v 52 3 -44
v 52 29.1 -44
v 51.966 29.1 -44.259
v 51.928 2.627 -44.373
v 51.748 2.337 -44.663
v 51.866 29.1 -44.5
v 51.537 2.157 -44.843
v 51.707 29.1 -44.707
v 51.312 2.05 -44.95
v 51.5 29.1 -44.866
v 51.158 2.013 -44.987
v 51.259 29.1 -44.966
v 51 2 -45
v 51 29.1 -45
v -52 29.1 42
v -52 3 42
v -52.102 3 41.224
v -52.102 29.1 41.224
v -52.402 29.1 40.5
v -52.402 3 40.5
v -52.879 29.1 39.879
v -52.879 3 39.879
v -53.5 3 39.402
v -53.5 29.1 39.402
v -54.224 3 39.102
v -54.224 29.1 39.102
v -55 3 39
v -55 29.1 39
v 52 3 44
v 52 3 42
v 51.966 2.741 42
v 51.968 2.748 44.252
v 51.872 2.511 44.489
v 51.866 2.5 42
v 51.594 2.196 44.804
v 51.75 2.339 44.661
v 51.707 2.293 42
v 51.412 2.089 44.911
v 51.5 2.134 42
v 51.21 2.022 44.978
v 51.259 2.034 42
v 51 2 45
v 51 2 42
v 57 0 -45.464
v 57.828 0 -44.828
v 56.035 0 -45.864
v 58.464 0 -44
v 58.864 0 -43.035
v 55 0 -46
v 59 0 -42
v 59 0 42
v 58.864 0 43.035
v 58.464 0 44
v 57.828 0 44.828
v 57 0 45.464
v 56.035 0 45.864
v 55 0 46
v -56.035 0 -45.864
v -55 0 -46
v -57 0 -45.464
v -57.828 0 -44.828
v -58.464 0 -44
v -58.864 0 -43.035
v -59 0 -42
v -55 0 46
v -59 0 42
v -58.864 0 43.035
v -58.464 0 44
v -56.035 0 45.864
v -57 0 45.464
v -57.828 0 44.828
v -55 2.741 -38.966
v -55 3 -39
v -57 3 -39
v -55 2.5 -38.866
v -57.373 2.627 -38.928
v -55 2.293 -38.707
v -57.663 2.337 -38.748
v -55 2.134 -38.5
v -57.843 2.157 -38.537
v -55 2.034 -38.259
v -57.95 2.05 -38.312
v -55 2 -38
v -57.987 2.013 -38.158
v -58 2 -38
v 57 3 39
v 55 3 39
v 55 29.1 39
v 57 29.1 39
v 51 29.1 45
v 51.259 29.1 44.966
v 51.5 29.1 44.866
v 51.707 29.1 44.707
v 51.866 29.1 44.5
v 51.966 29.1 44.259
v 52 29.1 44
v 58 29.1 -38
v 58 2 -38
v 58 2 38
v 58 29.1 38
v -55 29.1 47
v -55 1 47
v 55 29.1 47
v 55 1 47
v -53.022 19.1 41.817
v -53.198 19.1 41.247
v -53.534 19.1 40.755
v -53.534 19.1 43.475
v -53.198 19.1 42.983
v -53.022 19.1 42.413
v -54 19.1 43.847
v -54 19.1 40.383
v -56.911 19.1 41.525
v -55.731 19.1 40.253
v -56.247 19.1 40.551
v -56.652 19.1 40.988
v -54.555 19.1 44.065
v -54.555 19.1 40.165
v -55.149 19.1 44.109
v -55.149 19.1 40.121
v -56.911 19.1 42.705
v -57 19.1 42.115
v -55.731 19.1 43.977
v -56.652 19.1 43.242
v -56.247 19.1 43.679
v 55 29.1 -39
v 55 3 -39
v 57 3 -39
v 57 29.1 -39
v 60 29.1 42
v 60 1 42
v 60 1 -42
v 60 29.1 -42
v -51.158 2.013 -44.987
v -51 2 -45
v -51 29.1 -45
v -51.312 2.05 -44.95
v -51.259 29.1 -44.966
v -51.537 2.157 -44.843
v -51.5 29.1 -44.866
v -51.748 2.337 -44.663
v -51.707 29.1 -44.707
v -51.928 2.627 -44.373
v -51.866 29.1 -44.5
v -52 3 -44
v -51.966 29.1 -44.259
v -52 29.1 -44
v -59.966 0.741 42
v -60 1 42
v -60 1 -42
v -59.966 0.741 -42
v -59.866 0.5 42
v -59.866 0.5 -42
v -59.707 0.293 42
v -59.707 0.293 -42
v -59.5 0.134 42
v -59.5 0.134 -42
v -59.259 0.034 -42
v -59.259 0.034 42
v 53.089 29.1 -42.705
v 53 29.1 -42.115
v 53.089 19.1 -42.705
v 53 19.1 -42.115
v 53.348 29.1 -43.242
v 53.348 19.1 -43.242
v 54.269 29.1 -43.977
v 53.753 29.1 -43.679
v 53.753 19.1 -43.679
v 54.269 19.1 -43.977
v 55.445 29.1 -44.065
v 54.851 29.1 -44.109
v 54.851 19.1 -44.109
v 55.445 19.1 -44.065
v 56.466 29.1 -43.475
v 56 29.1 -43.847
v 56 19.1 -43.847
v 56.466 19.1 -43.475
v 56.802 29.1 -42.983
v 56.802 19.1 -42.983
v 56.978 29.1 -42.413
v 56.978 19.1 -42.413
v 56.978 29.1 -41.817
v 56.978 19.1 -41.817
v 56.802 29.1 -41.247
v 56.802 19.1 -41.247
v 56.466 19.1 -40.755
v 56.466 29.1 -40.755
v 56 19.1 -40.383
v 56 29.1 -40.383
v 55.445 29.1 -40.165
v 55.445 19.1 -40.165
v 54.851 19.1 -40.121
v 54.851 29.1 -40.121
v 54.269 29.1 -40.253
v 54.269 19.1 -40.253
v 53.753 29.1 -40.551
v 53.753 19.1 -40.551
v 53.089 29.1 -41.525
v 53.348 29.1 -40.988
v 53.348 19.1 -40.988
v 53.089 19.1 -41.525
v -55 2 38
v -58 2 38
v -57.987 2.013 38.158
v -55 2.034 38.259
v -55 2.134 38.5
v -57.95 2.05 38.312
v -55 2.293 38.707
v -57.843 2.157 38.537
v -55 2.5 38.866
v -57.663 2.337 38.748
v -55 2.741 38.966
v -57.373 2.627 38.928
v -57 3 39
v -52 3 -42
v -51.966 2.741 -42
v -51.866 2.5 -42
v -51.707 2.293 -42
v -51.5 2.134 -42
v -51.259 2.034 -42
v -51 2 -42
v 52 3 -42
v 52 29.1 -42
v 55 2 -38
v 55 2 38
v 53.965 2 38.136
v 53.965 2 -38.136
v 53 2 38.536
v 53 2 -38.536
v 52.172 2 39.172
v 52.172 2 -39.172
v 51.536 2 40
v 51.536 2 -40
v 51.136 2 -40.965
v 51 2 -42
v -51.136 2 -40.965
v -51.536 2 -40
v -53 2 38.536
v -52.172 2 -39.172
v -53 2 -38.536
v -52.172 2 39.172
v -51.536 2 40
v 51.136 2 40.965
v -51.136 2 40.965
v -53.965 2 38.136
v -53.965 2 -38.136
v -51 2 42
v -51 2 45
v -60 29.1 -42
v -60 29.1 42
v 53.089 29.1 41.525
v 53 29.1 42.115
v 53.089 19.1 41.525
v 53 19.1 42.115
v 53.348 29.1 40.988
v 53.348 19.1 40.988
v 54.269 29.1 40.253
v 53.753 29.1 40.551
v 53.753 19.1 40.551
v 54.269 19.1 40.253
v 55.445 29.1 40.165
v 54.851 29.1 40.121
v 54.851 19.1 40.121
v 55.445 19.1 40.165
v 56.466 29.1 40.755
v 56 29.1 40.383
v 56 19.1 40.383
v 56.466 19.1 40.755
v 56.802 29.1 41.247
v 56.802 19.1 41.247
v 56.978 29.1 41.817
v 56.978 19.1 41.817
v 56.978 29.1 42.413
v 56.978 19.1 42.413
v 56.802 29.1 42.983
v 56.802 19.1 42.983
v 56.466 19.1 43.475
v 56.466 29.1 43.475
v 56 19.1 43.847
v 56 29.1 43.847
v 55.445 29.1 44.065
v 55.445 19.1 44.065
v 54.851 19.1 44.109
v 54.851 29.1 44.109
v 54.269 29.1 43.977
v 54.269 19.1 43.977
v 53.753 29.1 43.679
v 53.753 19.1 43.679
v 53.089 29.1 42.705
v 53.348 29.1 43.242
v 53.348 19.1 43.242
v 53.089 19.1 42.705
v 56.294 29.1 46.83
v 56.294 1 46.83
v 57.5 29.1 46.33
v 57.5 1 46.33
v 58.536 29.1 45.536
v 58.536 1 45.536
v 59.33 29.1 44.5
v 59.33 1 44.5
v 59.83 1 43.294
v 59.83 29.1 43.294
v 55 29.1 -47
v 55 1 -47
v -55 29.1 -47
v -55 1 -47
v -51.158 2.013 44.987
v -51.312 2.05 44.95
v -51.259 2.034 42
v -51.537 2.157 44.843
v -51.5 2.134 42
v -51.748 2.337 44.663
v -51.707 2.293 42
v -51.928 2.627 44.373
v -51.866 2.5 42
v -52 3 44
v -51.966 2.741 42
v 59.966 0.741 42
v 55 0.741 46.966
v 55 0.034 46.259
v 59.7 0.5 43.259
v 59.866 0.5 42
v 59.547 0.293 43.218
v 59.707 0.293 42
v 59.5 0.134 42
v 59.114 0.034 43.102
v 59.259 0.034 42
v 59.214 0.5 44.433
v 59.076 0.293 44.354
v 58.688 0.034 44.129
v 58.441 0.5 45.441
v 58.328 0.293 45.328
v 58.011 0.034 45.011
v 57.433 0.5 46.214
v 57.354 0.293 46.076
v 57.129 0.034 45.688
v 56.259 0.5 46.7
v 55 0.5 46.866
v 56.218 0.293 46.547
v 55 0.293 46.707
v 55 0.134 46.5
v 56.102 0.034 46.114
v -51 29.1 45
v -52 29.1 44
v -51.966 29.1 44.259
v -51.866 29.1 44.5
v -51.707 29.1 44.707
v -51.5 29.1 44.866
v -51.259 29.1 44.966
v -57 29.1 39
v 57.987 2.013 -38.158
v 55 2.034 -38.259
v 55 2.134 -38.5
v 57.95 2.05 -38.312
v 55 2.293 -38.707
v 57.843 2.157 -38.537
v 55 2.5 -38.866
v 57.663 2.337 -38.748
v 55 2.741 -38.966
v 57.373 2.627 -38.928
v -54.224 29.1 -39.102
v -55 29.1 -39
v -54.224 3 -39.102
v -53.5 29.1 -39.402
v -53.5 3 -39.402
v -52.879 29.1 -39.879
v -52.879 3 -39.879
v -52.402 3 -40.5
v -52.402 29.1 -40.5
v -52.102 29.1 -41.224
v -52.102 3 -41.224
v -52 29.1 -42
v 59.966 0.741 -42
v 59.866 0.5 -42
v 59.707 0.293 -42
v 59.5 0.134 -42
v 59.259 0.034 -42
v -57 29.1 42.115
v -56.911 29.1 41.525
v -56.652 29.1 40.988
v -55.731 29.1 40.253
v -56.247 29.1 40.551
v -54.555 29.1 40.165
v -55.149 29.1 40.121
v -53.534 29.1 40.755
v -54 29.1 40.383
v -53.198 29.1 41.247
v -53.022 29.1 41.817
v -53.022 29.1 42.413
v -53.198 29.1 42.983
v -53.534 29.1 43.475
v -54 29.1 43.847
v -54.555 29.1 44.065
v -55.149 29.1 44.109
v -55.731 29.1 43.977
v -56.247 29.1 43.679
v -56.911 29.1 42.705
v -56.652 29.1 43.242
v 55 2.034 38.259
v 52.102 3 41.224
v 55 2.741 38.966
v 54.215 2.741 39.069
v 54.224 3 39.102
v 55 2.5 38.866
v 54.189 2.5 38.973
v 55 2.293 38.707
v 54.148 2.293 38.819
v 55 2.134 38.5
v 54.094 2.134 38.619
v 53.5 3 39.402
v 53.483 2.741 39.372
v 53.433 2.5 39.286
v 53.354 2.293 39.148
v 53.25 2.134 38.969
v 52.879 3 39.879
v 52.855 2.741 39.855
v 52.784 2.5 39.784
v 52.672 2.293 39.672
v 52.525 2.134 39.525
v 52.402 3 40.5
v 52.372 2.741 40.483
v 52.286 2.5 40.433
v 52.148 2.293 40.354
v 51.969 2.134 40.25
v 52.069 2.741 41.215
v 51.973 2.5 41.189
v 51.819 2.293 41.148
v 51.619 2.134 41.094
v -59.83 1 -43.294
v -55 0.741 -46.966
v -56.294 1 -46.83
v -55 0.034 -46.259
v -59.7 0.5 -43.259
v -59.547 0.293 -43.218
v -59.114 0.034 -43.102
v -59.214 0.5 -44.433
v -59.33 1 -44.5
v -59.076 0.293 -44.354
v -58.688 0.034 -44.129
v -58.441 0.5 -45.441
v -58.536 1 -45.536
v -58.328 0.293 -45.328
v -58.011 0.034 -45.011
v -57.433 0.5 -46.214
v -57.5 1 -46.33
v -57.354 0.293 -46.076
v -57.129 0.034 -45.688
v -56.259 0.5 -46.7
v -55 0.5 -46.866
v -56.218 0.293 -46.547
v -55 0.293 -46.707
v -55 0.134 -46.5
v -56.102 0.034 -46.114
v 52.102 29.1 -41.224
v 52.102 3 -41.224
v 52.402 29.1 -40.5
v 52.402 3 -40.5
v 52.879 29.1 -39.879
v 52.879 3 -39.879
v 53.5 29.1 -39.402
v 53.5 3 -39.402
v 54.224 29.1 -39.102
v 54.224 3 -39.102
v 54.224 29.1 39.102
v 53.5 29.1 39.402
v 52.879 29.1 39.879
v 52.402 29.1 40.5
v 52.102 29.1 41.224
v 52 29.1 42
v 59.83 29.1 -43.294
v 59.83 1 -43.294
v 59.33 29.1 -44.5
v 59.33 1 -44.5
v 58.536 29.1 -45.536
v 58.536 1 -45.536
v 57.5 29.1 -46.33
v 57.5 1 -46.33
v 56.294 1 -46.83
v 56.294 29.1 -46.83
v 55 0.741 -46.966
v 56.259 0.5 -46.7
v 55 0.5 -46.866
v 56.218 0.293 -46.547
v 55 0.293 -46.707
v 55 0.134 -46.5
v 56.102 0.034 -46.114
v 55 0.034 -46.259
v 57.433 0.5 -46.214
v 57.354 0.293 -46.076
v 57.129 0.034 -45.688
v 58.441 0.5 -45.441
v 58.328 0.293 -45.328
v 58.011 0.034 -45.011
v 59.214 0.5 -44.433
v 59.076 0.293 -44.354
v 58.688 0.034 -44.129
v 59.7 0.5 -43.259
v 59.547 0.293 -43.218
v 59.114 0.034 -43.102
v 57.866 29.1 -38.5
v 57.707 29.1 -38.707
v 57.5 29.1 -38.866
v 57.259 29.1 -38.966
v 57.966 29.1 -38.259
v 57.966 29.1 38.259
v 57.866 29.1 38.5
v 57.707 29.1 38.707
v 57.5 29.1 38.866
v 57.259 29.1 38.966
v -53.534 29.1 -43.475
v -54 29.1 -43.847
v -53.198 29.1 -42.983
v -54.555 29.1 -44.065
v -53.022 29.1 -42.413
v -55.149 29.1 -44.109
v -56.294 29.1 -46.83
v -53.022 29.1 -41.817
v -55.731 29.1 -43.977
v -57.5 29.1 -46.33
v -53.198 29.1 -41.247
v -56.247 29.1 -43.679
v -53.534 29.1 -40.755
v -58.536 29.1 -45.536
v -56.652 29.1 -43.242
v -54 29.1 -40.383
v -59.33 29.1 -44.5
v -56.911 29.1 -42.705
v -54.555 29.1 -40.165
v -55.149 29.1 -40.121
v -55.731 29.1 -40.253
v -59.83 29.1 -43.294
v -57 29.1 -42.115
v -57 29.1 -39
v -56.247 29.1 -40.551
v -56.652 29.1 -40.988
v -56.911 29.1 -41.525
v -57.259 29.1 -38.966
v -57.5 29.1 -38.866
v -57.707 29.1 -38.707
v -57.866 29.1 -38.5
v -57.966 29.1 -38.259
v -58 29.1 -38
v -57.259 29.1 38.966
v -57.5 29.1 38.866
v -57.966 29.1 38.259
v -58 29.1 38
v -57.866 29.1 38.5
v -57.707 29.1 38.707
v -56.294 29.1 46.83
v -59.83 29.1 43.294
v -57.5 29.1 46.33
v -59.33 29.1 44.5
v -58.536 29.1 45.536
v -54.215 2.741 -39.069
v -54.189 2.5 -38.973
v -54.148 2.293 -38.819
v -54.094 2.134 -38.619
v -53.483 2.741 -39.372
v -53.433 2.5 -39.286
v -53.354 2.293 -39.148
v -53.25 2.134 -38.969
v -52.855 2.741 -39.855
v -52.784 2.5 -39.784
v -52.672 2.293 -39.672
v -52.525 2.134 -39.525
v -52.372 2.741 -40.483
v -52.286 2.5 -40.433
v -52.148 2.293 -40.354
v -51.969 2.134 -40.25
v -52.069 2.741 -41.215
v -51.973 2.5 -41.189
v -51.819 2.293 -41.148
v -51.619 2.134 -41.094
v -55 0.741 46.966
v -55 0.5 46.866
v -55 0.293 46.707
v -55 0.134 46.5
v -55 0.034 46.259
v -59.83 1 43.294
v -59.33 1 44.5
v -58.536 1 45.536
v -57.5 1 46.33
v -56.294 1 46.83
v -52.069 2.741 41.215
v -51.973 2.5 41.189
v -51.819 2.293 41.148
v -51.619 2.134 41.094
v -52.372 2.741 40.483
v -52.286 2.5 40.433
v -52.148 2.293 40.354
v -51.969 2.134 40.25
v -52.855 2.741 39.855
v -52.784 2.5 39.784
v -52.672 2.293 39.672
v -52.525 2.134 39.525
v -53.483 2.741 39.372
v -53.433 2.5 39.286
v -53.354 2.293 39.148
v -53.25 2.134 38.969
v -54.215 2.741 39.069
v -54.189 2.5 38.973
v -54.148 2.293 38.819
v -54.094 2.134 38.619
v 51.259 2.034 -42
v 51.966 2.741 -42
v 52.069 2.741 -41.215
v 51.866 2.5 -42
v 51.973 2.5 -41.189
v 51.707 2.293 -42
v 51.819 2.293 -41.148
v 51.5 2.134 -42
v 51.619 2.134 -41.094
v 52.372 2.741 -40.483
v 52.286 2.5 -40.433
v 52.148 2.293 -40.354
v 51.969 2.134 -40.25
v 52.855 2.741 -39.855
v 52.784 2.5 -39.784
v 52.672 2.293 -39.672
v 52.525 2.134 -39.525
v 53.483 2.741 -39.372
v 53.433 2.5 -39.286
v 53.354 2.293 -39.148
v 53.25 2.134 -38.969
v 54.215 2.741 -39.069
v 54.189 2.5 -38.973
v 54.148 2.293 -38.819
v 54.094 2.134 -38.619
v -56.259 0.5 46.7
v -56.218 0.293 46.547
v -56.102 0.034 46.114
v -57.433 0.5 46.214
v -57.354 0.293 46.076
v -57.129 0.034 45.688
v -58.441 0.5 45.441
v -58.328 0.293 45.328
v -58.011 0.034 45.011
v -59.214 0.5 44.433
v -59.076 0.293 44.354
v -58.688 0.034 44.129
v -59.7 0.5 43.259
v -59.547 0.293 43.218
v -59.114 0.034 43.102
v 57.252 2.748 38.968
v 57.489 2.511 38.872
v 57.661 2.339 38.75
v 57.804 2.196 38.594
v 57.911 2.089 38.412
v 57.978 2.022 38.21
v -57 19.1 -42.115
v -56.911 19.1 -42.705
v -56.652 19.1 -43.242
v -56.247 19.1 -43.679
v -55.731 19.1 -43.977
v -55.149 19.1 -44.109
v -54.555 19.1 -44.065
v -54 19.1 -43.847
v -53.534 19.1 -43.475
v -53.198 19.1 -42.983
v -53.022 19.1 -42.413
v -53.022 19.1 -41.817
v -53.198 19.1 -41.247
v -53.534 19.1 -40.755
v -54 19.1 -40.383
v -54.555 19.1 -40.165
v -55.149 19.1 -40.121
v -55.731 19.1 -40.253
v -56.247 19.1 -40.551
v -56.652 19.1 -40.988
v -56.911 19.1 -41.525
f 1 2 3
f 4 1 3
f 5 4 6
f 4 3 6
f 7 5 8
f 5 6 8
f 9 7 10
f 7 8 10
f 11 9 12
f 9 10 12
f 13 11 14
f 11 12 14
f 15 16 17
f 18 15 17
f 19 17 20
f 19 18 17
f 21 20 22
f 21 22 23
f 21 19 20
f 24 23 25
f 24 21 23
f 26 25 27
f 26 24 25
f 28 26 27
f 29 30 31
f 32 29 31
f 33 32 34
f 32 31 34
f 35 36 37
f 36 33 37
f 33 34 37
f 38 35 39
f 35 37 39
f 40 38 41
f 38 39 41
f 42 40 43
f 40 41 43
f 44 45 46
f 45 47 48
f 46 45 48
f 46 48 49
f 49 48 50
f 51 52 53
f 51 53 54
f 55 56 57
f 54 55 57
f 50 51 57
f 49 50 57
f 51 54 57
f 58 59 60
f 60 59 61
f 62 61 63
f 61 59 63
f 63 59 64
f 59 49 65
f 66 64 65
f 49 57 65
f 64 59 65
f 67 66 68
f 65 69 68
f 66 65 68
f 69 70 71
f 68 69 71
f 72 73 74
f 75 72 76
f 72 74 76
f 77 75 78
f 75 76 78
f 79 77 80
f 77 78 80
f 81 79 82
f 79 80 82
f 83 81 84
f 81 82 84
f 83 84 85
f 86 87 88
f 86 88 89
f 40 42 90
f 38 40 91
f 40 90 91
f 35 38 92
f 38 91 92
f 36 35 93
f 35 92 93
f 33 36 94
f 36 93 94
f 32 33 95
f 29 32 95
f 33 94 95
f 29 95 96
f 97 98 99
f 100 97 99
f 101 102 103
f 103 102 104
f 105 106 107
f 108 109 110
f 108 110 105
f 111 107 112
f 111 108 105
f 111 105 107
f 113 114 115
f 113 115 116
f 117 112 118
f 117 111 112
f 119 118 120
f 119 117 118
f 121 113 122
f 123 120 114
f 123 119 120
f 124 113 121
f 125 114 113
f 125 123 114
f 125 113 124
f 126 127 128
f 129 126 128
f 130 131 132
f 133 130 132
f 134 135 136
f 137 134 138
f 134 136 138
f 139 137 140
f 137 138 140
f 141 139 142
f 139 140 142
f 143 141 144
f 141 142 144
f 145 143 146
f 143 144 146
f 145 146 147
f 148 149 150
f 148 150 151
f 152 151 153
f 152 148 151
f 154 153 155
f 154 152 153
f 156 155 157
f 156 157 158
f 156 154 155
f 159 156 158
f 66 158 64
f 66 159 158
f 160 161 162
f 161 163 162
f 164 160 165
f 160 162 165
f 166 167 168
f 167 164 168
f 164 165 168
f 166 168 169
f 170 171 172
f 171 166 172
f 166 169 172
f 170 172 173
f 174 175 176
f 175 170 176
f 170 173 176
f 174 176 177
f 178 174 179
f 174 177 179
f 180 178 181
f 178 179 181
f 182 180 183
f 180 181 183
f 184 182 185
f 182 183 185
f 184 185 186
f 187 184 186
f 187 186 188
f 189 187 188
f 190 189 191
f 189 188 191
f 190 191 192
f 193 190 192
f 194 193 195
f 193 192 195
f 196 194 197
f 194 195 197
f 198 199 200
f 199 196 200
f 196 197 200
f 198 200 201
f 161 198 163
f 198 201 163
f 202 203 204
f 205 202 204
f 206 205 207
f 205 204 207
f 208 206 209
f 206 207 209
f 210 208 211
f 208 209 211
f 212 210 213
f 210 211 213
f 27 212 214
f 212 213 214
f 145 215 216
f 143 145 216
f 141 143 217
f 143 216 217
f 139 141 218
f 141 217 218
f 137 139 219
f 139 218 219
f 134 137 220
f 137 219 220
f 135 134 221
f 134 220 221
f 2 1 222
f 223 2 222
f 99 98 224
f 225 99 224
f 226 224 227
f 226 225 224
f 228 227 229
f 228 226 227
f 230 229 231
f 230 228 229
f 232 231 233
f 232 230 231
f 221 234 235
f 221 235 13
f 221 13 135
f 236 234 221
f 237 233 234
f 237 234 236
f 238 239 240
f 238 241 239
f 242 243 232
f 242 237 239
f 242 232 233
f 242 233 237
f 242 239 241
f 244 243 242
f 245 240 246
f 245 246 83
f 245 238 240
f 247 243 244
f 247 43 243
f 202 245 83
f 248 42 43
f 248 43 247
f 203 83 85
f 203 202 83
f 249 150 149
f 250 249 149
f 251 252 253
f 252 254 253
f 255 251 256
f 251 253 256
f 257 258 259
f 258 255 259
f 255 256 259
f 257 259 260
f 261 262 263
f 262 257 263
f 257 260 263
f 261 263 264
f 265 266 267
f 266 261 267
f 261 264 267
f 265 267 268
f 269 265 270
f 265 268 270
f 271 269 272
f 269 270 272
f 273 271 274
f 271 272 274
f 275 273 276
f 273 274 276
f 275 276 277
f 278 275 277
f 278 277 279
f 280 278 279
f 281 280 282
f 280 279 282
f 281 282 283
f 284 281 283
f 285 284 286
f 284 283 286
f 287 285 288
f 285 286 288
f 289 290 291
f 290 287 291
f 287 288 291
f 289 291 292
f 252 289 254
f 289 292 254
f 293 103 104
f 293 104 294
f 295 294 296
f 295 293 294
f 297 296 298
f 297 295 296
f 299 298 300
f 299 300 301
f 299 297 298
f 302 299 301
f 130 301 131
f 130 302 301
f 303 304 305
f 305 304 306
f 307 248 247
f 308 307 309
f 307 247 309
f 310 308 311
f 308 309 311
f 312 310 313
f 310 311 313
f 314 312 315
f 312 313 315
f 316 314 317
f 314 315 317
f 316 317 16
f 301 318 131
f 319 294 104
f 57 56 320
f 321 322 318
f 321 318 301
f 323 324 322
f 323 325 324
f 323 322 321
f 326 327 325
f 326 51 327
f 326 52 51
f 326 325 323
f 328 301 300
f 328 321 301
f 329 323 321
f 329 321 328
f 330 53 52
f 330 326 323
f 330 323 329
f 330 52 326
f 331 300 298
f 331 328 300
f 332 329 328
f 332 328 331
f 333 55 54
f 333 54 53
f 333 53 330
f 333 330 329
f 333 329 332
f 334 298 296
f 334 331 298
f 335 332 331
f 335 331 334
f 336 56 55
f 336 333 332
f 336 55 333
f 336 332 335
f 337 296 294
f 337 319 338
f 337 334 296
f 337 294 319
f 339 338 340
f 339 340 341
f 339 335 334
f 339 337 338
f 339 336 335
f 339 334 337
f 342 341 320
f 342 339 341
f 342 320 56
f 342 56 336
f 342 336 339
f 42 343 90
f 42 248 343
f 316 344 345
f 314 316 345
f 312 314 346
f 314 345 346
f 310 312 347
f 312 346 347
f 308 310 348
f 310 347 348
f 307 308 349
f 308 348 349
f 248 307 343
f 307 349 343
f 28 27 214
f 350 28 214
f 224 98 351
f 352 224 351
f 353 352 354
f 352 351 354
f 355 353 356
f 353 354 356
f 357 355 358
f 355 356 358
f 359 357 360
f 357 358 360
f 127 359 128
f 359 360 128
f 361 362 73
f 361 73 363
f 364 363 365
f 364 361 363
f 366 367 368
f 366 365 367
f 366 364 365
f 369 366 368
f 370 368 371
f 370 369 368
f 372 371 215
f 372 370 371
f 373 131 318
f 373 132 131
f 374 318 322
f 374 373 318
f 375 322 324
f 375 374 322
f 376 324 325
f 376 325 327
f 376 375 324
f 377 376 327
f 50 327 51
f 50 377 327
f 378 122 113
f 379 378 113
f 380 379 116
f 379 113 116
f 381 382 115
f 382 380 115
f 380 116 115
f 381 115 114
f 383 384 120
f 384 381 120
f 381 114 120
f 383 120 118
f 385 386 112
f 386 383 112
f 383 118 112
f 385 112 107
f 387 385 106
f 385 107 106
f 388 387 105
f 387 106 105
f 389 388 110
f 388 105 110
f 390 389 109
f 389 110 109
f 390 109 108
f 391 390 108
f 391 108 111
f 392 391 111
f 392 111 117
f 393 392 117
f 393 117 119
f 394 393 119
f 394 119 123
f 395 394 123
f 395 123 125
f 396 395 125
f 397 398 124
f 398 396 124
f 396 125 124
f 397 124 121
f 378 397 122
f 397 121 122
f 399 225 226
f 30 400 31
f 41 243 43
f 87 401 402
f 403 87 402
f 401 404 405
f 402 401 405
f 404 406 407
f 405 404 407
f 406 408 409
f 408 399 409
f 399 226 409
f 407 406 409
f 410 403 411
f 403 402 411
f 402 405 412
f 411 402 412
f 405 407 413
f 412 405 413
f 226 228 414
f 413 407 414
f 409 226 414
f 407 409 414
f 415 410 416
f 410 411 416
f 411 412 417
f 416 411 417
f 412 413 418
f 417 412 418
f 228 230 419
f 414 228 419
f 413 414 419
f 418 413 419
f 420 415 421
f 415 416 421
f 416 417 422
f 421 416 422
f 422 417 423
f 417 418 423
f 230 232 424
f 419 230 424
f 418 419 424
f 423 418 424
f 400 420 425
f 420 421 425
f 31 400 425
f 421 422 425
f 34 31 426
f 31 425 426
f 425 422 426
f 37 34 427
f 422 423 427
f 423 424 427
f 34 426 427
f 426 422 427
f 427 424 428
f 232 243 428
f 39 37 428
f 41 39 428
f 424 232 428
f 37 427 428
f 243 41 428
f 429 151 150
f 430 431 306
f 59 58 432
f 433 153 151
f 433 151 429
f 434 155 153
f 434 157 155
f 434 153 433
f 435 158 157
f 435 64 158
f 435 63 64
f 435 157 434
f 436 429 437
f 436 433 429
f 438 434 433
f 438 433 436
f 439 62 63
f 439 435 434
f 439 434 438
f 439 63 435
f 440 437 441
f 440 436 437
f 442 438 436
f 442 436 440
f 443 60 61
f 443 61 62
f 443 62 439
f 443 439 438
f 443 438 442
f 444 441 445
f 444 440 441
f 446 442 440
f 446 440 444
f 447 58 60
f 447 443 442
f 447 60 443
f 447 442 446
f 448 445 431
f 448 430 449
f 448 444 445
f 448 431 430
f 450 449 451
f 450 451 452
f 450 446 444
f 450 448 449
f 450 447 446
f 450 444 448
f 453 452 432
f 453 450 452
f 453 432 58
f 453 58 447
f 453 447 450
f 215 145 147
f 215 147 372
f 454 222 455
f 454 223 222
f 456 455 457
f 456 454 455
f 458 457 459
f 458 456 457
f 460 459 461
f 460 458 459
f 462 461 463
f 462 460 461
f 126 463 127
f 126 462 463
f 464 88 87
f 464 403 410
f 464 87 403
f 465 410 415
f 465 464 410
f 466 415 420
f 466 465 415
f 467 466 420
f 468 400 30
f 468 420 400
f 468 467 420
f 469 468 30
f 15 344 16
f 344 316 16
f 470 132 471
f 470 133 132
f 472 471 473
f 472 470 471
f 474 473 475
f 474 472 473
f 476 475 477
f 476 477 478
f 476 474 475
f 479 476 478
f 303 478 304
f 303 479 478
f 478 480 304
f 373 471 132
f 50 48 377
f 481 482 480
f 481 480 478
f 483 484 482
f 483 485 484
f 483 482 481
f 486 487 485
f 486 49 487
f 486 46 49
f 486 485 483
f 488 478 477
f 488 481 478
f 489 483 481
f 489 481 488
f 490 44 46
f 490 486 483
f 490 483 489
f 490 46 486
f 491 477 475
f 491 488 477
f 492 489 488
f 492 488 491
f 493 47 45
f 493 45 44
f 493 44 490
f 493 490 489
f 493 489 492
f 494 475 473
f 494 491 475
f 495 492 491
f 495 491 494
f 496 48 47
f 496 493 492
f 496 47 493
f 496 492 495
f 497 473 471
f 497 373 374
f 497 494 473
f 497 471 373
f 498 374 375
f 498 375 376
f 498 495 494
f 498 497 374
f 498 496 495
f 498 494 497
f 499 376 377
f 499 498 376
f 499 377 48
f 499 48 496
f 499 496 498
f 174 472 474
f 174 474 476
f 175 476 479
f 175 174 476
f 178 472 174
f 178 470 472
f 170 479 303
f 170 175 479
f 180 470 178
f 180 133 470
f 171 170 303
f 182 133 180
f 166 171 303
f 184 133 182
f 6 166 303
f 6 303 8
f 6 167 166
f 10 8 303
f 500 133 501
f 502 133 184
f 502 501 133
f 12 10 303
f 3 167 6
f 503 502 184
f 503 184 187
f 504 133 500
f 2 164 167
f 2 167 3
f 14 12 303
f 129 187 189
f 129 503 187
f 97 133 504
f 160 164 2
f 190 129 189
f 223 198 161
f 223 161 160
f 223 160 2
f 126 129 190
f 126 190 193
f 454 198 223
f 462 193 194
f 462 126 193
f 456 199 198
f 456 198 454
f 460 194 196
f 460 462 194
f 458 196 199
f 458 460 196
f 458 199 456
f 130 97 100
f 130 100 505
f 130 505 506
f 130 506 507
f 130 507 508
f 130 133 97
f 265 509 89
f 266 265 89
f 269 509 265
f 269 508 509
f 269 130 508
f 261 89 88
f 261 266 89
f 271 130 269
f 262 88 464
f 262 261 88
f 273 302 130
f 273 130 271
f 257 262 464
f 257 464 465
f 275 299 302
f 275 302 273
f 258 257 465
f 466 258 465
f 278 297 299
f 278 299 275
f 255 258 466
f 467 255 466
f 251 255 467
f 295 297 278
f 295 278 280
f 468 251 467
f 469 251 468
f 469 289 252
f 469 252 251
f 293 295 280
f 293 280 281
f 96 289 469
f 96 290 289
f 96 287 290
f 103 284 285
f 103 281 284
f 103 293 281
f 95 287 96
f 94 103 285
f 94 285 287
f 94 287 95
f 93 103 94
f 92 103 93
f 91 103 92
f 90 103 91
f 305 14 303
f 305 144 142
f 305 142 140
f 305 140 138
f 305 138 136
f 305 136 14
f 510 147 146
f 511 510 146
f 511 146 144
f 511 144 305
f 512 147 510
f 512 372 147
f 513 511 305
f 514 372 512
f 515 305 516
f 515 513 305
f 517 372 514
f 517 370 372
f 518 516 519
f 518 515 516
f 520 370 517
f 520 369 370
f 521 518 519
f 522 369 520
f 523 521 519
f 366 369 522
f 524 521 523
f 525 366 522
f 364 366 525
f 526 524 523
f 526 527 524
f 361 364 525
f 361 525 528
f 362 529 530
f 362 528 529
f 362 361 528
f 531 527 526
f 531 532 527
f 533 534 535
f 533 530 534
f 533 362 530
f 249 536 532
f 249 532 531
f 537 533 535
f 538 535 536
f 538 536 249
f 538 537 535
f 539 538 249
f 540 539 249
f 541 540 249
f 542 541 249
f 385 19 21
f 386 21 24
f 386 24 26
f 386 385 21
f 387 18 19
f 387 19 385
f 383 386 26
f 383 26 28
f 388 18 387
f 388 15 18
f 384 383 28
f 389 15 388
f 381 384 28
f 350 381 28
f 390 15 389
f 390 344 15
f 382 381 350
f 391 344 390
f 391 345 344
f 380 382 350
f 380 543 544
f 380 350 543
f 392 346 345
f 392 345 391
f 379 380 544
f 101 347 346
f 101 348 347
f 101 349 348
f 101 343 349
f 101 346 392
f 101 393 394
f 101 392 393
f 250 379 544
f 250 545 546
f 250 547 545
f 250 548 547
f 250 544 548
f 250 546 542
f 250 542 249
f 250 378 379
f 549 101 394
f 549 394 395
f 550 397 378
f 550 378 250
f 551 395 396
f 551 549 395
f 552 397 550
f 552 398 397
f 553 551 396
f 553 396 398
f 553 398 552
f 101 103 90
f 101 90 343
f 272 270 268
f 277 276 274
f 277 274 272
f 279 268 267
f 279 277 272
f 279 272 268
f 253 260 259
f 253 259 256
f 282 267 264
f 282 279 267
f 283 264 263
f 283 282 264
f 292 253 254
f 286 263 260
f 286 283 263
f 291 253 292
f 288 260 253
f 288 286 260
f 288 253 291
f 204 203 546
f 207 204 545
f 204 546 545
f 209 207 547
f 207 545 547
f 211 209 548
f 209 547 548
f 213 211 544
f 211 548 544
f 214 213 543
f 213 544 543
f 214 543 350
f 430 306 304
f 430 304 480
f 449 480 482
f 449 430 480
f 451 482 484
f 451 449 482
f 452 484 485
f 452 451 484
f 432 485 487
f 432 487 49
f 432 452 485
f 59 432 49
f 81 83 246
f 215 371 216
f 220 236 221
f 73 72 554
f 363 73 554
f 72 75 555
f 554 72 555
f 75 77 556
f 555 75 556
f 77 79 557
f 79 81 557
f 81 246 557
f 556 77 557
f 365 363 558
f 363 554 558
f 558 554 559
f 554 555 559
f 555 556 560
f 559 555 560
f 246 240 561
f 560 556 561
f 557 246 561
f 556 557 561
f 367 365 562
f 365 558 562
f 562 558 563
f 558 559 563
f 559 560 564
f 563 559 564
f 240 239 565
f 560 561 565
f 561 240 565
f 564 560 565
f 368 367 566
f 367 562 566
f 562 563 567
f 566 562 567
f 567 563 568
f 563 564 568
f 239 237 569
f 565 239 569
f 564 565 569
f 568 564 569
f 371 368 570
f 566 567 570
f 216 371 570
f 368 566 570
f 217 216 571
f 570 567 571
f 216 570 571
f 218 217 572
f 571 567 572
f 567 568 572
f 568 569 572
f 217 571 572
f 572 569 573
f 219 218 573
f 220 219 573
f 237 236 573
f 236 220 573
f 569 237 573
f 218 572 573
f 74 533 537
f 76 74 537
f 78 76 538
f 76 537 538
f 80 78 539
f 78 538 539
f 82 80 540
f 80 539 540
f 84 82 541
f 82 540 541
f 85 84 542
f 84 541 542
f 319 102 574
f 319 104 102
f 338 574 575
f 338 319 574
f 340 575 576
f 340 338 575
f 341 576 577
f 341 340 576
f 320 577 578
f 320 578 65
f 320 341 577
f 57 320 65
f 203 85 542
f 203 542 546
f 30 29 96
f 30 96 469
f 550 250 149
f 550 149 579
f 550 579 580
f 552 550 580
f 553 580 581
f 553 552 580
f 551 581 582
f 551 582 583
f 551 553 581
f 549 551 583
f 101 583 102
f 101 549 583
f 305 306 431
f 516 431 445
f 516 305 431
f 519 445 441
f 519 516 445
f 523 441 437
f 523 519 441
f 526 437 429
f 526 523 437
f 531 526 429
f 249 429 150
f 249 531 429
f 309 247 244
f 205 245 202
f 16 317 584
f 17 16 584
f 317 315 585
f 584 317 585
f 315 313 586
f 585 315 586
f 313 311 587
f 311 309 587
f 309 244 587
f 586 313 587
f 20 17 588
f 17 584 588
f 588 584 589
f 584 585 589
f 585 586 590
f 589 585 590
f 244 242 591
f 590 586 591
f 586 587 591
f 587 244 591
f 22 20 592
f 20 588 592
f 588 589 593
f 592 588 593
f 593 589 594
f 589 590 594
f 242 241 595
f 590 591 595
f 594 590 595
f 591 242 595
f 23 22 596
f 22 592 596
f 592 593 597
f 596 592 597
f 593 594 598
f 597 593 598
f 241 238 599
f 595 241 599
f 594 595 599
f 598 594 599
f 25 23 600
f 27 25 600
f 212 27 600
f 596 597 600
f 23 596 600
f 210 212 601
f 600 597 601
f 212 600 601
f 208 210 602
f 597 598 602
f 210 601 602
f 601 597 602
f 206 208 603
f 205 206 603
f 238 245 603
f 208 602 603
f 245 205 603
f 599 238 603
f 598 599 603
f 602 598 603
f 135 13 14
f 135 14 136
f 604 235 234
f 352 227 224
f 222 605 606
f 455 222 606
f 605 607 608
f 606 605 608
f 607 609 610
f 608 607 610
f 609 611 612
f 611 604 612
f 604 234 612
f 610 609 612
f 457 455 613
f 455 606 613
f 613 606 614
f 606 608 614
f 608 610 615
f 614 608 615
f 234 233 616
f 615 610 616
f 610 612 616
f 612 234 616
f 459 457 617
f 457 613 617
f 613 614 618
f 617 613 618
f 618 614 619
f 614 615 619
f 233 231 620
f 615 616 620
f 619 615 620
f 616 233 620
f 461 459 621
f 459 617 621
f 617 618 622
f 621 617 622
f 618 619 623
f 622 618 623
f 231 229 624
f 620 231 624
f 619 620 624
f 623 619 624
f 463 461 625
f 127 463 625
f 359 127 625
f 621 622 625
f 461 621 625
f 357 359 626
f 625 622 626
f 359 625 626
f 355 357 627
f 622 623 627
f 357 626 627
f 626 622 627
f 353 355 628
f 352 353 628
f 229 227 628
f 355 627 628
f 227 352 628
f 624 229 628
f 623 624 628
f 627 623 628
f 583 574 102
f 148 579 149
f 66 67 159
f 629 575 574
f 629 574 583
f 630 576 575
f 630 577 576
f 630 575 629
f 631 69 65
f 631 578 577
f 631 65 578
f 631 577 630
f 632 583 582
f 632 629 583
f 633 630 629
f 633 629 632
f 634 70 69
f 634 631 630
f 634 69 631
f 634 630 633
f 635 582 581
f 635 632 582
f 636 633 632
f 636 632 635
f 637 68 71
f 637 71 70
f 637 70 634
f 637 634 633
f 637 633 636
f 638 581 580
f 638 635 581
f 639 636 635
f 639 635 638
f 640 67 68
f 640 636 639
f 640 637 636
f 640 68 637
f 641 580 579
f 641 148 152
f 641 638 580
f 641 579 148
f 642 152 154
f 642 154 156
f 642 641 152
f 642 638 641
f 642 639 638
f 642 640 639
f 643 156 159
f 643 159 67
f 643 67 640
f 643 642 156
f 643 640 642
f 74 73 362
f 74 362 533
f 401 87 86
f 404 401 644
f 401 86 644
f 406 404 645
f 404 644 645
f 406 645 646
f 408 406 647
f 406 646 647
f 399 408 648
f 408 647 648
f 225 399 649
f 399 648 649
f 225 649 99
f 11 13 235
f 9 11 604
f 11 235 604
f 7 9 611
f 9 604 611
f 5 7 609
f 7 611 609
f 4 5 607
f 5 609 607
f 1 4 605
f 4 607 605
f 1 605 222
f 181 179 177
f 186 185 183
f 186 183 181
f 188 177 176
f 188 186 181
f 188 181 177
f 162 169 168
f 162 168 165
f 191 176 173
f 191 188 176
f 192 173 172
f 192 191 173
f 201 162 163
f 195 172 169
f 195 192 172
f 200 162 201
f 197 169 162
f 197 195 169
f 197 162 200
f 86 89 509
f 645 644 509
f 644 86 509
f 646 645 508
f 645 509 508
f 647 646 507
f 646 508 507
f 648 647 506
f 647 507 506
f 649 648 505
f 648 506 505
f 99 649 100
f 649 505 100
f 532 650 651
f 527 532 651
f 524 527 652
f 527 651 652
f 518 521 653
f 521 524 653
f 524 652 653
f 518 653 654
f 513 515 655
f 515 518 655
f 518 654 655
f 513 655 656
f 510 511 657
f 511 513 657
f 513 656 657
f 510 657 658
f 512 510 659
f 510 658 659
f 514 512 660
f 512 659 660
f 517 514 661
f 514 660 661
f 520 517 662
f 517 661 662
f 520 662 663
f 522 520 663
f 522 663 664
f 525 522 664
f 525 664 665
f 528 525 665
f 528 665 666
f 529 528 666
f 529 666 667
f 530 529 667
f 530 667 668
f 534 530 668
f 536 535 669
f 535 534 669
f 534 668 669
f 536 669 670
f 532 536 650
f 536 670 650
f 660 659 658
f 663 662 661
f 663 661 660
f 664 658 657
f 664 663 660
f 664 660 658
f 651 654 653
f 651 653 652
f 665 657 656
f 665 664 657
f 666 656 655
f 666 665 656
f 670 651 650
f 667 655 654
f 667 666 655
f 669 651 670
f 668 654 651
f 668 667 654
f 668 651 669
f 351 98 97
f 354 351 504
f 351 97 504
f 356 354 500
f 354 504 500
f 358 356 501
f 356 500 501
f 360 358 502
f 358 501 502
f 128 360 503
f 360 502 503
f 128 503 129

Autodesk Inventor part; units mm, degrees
ref_plane "YZ Plane" through (0, 0, 0) normal (1, 0, 0) x (0, 1, 0)
ref_plane "XZ Plane" through (0, 0, 0) normal (0, 1, 0) x (-1, 0, 0)
ref_plane "XY Plane" through (0, 0, 0) normal (0, 0, 1) x (1, 0, 0)
sketch "Esquisse1" plane through (0, 0, 0) normal (0, 1, 0) x (-1, 0, 0)
  line L0 (60, 47) -> (-60, 47)
  line L1 (-60, 47) -> (-60, -47)
  line L2 (-60, -47) -> (60, -47)
  line L3 (60, -47) -> (60, 47)
  line L4 (60, 47) -> (-60, -47) construction
  line L5 (-60, 47) -> (60, -47) construction
  line L6 (60, -47) -> (52, -47)
  line L7 (52, -47) -> (52, -39)
  line L8 (52, -39) -> (60, -39)
  line L9 (60, -39) -> (60, -47)
  line L10 (-60, -47) -> (-52, -47)
  line L11 (-52, -47) -> (-52, -39)
  line L12 (-52, -39) -> (-60, -39)
  line L13 (-60, -39) -> (-60, -47)
  line L14 (60, 47) -> (52, 47)
  line L15 (52, 47) -> (52, 39)
  line L16 (52, 39) -> (60, 39)
  line L17 (60, 39) -> (60, 47)
  line L18 (-60, 47) -> (-52, 47)
  line L19 (-52, 47) -> (-52, 39)
  line L20 (-52, 39) -> (-60, 39)
  line L21 (-60, 39) -> (-60, 47)
  circle A0 centre (-55, -42.115) radius 2
  line L22 (0, -47.6968) -> (0, 50.167) construction
  line L23 (81.8074, 0) -> (-86.221, 0) construction
  circle A1 centre (55, -42.115) radius 2
  circle A2 centre (-55, 42.115) radius 2
  circle A3 centre (55, 42.115) radius 2
  line L24 (58, -47) -> (58, 47)
  line L25 (60, 45) -> (-60, 45)
  line L26 (-60, -45) -> (60, -45)
  line L27 (-58, -47) -> (-58, 47)
  point P0 (0, 0)
  point P1 (-58, 39)
  point P2 (-58, -39)
  point P3 (-52, -45)
  point P4 (52, -45)
  point P5 (58, -39)
  point P6 (58, 39)
  point P7 (52, 45)
  point P8 (-52, 45)
  dimension "d0" = 120
  dimension "d1" = 94
  dimension "d2" = 8
  dimension "d3" = 8
  dimension "d4" = 8
  dimension "d5" = 8
  dimension "d6" = 8
  dimension "d8" = 4
  dimension "d9" = 55
  dimension "d10" = 42.115
  dimension "d11" = 8
  dimension "d12" = 2
  dimension "d13" = 2
  dimension "d14" = 2
  dimension "d15" = 2
extrude "Extrusion1" add sketch "Esquisse1" along normal blind 2 contours L15 L16 L24 L8 L7 L26 L11 L12 L27 L20 L19 L25
extrude "Extrusion2" add sketch "Esquisse1" along normal blind 29.1 contours L3 L25 L24 L0 | L24 L25 L15 L0 | L3 L16 L24 L25 | L15 L25 L19 L0 | L24 L16 L15 L25 | L3 L8 L24 L16 | L19 L25 L27 L0 | L3 L26 L24 L8 | L27 L25 L1 L0 | L19 L20 L27 L25 | L24 L26 L7 L8 | L3 L2 L24 L26 | L27 L20 L1 L25 | L24 L2 L7 L26 | L27 L12 L1 L20 | L7 L2 L11 L26 | L27 L26 L1 L12 | L12 L11 L26 L27 | L11 L2 L27 L26 | L27 L2 L1 L26
fillet "Congé1" radius 5 4 edges at (-60, 14.55, 47) (-60, 14.55, -47) (60, 14.55, -47) (60, 14.55, 47)
fillet "Congé2" radius 3 4 edges at (-52, 15.55, -39) (-52, 15.55, 39) (52, 15.55, -39) (52, 15.55, 39)
fillet "Congé3" radius 1 16 edges at (-58, 15.55, -39) (-52, 15.55, -45) (-52, 2, -43.5) (-56.5, 2, -39) (56.5, 2, -39) (52, 2, -43.5) (52, 15.55, -45) (58, 15.55, -39) (58, 15.55, 39) (52, 15.55, 45) (52, 2, 43.5) (56.5, 2, 39) (-56.5, 2, 39) (-52, 2, 43.5) (-58, 15.55, 39) (-52, 15.55, 45)
extrude "Extrusion3" add sketch "Esquisse1" along normal blind 19.1 contours A0 | A1 | A2 | A3
thread "Filetage1" size "M4x0.7" class "6H" standard "ANSI Metric M Profile" length 40
thread "Filetage2" size "M4x0.7" class "6H" standard "ANSI Metric M Profile" length 40
thread "Filetage3" size "M4x0.7" class "6H" standard "ANSI Metric M Profile" length 40
thread "Filetage4" size "M4x0.7" class "6H" standard "ANSI Metric M Profile" length 40
fillet "Congé4" radius 1 4 edges at (0, 0, 47) (60, 0, 0) (0, 0, -47) (-60, 0, 0)
sketch "Esquisse2" plane through (0, 29.1, 0) normal (0, 1, 0) x (1, 0, 0)
  arc A0 (55, -47) -> (60, -42) centre (55, -42) ccw projected
  line L0 (60, -42) -> (60, 42) projected
  arc A1 (60, 42) -> (55, 47) centre (55, 42) ccw projected
  line L1 (55, 47) -> (-55, 47) projected
  arc A2 (-55, 47) -> (-60, 42) centre (-55, 42) ccw projected
  line L2 (-60, 42) -> (-60, -42) projected
  arc A3 (-60, -42) -> (-55, -47) centre (-55, -42) ccw projected
  line L3 (-55, -47) -> (55, -47) projected
  circle A4 centre (55, 42.115) radius 2 projected
  circle A5 centre (55, -42.115) radius 2 projected
  circle A6 centre (-55, 42.115) radius 2 projected
  circle A7 centre (-55, -42.115) radius 2 projected
  arc A8 (55, -39) -> (52, -42) centre (55, -42) ccw projected
  line L4 (52, -42) -> (52, -44) projected
  arc A9 (51, -45) -> (52, -44) centre (51, -44) ccw projected
  line L5 (51, -45) -> (-51, -45) projected
  arc A10 (-52, -44) -> (-51, -45) centre (-51, -44) ccw projected
  line L6 (-52, -44) -> (-52, -42) projected
  arc A11 (-52, -42) -> (-55, -39) centre (-55, -42) ccw projected
  line L7 (-55, -39) -> (-57, -39) projected
  arc A12 (-58, -38) -> (-57, -39) centre (-57, -38) ccw projected
  line L8 (-58, -38) -> (-58, 38) projected
  arc A13 (-57, 39) -> (-58, 38) centre (-57, 38) ccw projected
  line L9 (-57, 39) -> (-55, 39) projected
  arc A14 (-55, 39) -> (-52, 42) centre (-55, 42) ccw projected
  line L10 (-52, 42) -> (-52, 44) projected
  arc A15 (-51, 45) -> (-52, 44) centre (-51, 44) ccw projected
  line L11 (-51, 45) -> (51, 45) projected
  arc A16 (52, 44) -> (51, 45) centre (51, 44) ccw projected
  line L12 (52, 44) -> (52, 42) projected
  arc A17 (52, 42) -> (55, 39) centre (55, 42) ccw projected
  line L13 (55, 39) -> (57, 39) projected
  arc A18 (58, 38) -> (57, 39) centre (57, 38) ccw projected
  line L14 (58, 38) -> (58, -38) projected
  arc A19 (57, -39) -> (58, -38) centre (57, -38) ccw projected
  line L15 (57, -39) -> (55, -39) projected
  point P0 (0, 0)
properties part number "Boitier_aluminium"
